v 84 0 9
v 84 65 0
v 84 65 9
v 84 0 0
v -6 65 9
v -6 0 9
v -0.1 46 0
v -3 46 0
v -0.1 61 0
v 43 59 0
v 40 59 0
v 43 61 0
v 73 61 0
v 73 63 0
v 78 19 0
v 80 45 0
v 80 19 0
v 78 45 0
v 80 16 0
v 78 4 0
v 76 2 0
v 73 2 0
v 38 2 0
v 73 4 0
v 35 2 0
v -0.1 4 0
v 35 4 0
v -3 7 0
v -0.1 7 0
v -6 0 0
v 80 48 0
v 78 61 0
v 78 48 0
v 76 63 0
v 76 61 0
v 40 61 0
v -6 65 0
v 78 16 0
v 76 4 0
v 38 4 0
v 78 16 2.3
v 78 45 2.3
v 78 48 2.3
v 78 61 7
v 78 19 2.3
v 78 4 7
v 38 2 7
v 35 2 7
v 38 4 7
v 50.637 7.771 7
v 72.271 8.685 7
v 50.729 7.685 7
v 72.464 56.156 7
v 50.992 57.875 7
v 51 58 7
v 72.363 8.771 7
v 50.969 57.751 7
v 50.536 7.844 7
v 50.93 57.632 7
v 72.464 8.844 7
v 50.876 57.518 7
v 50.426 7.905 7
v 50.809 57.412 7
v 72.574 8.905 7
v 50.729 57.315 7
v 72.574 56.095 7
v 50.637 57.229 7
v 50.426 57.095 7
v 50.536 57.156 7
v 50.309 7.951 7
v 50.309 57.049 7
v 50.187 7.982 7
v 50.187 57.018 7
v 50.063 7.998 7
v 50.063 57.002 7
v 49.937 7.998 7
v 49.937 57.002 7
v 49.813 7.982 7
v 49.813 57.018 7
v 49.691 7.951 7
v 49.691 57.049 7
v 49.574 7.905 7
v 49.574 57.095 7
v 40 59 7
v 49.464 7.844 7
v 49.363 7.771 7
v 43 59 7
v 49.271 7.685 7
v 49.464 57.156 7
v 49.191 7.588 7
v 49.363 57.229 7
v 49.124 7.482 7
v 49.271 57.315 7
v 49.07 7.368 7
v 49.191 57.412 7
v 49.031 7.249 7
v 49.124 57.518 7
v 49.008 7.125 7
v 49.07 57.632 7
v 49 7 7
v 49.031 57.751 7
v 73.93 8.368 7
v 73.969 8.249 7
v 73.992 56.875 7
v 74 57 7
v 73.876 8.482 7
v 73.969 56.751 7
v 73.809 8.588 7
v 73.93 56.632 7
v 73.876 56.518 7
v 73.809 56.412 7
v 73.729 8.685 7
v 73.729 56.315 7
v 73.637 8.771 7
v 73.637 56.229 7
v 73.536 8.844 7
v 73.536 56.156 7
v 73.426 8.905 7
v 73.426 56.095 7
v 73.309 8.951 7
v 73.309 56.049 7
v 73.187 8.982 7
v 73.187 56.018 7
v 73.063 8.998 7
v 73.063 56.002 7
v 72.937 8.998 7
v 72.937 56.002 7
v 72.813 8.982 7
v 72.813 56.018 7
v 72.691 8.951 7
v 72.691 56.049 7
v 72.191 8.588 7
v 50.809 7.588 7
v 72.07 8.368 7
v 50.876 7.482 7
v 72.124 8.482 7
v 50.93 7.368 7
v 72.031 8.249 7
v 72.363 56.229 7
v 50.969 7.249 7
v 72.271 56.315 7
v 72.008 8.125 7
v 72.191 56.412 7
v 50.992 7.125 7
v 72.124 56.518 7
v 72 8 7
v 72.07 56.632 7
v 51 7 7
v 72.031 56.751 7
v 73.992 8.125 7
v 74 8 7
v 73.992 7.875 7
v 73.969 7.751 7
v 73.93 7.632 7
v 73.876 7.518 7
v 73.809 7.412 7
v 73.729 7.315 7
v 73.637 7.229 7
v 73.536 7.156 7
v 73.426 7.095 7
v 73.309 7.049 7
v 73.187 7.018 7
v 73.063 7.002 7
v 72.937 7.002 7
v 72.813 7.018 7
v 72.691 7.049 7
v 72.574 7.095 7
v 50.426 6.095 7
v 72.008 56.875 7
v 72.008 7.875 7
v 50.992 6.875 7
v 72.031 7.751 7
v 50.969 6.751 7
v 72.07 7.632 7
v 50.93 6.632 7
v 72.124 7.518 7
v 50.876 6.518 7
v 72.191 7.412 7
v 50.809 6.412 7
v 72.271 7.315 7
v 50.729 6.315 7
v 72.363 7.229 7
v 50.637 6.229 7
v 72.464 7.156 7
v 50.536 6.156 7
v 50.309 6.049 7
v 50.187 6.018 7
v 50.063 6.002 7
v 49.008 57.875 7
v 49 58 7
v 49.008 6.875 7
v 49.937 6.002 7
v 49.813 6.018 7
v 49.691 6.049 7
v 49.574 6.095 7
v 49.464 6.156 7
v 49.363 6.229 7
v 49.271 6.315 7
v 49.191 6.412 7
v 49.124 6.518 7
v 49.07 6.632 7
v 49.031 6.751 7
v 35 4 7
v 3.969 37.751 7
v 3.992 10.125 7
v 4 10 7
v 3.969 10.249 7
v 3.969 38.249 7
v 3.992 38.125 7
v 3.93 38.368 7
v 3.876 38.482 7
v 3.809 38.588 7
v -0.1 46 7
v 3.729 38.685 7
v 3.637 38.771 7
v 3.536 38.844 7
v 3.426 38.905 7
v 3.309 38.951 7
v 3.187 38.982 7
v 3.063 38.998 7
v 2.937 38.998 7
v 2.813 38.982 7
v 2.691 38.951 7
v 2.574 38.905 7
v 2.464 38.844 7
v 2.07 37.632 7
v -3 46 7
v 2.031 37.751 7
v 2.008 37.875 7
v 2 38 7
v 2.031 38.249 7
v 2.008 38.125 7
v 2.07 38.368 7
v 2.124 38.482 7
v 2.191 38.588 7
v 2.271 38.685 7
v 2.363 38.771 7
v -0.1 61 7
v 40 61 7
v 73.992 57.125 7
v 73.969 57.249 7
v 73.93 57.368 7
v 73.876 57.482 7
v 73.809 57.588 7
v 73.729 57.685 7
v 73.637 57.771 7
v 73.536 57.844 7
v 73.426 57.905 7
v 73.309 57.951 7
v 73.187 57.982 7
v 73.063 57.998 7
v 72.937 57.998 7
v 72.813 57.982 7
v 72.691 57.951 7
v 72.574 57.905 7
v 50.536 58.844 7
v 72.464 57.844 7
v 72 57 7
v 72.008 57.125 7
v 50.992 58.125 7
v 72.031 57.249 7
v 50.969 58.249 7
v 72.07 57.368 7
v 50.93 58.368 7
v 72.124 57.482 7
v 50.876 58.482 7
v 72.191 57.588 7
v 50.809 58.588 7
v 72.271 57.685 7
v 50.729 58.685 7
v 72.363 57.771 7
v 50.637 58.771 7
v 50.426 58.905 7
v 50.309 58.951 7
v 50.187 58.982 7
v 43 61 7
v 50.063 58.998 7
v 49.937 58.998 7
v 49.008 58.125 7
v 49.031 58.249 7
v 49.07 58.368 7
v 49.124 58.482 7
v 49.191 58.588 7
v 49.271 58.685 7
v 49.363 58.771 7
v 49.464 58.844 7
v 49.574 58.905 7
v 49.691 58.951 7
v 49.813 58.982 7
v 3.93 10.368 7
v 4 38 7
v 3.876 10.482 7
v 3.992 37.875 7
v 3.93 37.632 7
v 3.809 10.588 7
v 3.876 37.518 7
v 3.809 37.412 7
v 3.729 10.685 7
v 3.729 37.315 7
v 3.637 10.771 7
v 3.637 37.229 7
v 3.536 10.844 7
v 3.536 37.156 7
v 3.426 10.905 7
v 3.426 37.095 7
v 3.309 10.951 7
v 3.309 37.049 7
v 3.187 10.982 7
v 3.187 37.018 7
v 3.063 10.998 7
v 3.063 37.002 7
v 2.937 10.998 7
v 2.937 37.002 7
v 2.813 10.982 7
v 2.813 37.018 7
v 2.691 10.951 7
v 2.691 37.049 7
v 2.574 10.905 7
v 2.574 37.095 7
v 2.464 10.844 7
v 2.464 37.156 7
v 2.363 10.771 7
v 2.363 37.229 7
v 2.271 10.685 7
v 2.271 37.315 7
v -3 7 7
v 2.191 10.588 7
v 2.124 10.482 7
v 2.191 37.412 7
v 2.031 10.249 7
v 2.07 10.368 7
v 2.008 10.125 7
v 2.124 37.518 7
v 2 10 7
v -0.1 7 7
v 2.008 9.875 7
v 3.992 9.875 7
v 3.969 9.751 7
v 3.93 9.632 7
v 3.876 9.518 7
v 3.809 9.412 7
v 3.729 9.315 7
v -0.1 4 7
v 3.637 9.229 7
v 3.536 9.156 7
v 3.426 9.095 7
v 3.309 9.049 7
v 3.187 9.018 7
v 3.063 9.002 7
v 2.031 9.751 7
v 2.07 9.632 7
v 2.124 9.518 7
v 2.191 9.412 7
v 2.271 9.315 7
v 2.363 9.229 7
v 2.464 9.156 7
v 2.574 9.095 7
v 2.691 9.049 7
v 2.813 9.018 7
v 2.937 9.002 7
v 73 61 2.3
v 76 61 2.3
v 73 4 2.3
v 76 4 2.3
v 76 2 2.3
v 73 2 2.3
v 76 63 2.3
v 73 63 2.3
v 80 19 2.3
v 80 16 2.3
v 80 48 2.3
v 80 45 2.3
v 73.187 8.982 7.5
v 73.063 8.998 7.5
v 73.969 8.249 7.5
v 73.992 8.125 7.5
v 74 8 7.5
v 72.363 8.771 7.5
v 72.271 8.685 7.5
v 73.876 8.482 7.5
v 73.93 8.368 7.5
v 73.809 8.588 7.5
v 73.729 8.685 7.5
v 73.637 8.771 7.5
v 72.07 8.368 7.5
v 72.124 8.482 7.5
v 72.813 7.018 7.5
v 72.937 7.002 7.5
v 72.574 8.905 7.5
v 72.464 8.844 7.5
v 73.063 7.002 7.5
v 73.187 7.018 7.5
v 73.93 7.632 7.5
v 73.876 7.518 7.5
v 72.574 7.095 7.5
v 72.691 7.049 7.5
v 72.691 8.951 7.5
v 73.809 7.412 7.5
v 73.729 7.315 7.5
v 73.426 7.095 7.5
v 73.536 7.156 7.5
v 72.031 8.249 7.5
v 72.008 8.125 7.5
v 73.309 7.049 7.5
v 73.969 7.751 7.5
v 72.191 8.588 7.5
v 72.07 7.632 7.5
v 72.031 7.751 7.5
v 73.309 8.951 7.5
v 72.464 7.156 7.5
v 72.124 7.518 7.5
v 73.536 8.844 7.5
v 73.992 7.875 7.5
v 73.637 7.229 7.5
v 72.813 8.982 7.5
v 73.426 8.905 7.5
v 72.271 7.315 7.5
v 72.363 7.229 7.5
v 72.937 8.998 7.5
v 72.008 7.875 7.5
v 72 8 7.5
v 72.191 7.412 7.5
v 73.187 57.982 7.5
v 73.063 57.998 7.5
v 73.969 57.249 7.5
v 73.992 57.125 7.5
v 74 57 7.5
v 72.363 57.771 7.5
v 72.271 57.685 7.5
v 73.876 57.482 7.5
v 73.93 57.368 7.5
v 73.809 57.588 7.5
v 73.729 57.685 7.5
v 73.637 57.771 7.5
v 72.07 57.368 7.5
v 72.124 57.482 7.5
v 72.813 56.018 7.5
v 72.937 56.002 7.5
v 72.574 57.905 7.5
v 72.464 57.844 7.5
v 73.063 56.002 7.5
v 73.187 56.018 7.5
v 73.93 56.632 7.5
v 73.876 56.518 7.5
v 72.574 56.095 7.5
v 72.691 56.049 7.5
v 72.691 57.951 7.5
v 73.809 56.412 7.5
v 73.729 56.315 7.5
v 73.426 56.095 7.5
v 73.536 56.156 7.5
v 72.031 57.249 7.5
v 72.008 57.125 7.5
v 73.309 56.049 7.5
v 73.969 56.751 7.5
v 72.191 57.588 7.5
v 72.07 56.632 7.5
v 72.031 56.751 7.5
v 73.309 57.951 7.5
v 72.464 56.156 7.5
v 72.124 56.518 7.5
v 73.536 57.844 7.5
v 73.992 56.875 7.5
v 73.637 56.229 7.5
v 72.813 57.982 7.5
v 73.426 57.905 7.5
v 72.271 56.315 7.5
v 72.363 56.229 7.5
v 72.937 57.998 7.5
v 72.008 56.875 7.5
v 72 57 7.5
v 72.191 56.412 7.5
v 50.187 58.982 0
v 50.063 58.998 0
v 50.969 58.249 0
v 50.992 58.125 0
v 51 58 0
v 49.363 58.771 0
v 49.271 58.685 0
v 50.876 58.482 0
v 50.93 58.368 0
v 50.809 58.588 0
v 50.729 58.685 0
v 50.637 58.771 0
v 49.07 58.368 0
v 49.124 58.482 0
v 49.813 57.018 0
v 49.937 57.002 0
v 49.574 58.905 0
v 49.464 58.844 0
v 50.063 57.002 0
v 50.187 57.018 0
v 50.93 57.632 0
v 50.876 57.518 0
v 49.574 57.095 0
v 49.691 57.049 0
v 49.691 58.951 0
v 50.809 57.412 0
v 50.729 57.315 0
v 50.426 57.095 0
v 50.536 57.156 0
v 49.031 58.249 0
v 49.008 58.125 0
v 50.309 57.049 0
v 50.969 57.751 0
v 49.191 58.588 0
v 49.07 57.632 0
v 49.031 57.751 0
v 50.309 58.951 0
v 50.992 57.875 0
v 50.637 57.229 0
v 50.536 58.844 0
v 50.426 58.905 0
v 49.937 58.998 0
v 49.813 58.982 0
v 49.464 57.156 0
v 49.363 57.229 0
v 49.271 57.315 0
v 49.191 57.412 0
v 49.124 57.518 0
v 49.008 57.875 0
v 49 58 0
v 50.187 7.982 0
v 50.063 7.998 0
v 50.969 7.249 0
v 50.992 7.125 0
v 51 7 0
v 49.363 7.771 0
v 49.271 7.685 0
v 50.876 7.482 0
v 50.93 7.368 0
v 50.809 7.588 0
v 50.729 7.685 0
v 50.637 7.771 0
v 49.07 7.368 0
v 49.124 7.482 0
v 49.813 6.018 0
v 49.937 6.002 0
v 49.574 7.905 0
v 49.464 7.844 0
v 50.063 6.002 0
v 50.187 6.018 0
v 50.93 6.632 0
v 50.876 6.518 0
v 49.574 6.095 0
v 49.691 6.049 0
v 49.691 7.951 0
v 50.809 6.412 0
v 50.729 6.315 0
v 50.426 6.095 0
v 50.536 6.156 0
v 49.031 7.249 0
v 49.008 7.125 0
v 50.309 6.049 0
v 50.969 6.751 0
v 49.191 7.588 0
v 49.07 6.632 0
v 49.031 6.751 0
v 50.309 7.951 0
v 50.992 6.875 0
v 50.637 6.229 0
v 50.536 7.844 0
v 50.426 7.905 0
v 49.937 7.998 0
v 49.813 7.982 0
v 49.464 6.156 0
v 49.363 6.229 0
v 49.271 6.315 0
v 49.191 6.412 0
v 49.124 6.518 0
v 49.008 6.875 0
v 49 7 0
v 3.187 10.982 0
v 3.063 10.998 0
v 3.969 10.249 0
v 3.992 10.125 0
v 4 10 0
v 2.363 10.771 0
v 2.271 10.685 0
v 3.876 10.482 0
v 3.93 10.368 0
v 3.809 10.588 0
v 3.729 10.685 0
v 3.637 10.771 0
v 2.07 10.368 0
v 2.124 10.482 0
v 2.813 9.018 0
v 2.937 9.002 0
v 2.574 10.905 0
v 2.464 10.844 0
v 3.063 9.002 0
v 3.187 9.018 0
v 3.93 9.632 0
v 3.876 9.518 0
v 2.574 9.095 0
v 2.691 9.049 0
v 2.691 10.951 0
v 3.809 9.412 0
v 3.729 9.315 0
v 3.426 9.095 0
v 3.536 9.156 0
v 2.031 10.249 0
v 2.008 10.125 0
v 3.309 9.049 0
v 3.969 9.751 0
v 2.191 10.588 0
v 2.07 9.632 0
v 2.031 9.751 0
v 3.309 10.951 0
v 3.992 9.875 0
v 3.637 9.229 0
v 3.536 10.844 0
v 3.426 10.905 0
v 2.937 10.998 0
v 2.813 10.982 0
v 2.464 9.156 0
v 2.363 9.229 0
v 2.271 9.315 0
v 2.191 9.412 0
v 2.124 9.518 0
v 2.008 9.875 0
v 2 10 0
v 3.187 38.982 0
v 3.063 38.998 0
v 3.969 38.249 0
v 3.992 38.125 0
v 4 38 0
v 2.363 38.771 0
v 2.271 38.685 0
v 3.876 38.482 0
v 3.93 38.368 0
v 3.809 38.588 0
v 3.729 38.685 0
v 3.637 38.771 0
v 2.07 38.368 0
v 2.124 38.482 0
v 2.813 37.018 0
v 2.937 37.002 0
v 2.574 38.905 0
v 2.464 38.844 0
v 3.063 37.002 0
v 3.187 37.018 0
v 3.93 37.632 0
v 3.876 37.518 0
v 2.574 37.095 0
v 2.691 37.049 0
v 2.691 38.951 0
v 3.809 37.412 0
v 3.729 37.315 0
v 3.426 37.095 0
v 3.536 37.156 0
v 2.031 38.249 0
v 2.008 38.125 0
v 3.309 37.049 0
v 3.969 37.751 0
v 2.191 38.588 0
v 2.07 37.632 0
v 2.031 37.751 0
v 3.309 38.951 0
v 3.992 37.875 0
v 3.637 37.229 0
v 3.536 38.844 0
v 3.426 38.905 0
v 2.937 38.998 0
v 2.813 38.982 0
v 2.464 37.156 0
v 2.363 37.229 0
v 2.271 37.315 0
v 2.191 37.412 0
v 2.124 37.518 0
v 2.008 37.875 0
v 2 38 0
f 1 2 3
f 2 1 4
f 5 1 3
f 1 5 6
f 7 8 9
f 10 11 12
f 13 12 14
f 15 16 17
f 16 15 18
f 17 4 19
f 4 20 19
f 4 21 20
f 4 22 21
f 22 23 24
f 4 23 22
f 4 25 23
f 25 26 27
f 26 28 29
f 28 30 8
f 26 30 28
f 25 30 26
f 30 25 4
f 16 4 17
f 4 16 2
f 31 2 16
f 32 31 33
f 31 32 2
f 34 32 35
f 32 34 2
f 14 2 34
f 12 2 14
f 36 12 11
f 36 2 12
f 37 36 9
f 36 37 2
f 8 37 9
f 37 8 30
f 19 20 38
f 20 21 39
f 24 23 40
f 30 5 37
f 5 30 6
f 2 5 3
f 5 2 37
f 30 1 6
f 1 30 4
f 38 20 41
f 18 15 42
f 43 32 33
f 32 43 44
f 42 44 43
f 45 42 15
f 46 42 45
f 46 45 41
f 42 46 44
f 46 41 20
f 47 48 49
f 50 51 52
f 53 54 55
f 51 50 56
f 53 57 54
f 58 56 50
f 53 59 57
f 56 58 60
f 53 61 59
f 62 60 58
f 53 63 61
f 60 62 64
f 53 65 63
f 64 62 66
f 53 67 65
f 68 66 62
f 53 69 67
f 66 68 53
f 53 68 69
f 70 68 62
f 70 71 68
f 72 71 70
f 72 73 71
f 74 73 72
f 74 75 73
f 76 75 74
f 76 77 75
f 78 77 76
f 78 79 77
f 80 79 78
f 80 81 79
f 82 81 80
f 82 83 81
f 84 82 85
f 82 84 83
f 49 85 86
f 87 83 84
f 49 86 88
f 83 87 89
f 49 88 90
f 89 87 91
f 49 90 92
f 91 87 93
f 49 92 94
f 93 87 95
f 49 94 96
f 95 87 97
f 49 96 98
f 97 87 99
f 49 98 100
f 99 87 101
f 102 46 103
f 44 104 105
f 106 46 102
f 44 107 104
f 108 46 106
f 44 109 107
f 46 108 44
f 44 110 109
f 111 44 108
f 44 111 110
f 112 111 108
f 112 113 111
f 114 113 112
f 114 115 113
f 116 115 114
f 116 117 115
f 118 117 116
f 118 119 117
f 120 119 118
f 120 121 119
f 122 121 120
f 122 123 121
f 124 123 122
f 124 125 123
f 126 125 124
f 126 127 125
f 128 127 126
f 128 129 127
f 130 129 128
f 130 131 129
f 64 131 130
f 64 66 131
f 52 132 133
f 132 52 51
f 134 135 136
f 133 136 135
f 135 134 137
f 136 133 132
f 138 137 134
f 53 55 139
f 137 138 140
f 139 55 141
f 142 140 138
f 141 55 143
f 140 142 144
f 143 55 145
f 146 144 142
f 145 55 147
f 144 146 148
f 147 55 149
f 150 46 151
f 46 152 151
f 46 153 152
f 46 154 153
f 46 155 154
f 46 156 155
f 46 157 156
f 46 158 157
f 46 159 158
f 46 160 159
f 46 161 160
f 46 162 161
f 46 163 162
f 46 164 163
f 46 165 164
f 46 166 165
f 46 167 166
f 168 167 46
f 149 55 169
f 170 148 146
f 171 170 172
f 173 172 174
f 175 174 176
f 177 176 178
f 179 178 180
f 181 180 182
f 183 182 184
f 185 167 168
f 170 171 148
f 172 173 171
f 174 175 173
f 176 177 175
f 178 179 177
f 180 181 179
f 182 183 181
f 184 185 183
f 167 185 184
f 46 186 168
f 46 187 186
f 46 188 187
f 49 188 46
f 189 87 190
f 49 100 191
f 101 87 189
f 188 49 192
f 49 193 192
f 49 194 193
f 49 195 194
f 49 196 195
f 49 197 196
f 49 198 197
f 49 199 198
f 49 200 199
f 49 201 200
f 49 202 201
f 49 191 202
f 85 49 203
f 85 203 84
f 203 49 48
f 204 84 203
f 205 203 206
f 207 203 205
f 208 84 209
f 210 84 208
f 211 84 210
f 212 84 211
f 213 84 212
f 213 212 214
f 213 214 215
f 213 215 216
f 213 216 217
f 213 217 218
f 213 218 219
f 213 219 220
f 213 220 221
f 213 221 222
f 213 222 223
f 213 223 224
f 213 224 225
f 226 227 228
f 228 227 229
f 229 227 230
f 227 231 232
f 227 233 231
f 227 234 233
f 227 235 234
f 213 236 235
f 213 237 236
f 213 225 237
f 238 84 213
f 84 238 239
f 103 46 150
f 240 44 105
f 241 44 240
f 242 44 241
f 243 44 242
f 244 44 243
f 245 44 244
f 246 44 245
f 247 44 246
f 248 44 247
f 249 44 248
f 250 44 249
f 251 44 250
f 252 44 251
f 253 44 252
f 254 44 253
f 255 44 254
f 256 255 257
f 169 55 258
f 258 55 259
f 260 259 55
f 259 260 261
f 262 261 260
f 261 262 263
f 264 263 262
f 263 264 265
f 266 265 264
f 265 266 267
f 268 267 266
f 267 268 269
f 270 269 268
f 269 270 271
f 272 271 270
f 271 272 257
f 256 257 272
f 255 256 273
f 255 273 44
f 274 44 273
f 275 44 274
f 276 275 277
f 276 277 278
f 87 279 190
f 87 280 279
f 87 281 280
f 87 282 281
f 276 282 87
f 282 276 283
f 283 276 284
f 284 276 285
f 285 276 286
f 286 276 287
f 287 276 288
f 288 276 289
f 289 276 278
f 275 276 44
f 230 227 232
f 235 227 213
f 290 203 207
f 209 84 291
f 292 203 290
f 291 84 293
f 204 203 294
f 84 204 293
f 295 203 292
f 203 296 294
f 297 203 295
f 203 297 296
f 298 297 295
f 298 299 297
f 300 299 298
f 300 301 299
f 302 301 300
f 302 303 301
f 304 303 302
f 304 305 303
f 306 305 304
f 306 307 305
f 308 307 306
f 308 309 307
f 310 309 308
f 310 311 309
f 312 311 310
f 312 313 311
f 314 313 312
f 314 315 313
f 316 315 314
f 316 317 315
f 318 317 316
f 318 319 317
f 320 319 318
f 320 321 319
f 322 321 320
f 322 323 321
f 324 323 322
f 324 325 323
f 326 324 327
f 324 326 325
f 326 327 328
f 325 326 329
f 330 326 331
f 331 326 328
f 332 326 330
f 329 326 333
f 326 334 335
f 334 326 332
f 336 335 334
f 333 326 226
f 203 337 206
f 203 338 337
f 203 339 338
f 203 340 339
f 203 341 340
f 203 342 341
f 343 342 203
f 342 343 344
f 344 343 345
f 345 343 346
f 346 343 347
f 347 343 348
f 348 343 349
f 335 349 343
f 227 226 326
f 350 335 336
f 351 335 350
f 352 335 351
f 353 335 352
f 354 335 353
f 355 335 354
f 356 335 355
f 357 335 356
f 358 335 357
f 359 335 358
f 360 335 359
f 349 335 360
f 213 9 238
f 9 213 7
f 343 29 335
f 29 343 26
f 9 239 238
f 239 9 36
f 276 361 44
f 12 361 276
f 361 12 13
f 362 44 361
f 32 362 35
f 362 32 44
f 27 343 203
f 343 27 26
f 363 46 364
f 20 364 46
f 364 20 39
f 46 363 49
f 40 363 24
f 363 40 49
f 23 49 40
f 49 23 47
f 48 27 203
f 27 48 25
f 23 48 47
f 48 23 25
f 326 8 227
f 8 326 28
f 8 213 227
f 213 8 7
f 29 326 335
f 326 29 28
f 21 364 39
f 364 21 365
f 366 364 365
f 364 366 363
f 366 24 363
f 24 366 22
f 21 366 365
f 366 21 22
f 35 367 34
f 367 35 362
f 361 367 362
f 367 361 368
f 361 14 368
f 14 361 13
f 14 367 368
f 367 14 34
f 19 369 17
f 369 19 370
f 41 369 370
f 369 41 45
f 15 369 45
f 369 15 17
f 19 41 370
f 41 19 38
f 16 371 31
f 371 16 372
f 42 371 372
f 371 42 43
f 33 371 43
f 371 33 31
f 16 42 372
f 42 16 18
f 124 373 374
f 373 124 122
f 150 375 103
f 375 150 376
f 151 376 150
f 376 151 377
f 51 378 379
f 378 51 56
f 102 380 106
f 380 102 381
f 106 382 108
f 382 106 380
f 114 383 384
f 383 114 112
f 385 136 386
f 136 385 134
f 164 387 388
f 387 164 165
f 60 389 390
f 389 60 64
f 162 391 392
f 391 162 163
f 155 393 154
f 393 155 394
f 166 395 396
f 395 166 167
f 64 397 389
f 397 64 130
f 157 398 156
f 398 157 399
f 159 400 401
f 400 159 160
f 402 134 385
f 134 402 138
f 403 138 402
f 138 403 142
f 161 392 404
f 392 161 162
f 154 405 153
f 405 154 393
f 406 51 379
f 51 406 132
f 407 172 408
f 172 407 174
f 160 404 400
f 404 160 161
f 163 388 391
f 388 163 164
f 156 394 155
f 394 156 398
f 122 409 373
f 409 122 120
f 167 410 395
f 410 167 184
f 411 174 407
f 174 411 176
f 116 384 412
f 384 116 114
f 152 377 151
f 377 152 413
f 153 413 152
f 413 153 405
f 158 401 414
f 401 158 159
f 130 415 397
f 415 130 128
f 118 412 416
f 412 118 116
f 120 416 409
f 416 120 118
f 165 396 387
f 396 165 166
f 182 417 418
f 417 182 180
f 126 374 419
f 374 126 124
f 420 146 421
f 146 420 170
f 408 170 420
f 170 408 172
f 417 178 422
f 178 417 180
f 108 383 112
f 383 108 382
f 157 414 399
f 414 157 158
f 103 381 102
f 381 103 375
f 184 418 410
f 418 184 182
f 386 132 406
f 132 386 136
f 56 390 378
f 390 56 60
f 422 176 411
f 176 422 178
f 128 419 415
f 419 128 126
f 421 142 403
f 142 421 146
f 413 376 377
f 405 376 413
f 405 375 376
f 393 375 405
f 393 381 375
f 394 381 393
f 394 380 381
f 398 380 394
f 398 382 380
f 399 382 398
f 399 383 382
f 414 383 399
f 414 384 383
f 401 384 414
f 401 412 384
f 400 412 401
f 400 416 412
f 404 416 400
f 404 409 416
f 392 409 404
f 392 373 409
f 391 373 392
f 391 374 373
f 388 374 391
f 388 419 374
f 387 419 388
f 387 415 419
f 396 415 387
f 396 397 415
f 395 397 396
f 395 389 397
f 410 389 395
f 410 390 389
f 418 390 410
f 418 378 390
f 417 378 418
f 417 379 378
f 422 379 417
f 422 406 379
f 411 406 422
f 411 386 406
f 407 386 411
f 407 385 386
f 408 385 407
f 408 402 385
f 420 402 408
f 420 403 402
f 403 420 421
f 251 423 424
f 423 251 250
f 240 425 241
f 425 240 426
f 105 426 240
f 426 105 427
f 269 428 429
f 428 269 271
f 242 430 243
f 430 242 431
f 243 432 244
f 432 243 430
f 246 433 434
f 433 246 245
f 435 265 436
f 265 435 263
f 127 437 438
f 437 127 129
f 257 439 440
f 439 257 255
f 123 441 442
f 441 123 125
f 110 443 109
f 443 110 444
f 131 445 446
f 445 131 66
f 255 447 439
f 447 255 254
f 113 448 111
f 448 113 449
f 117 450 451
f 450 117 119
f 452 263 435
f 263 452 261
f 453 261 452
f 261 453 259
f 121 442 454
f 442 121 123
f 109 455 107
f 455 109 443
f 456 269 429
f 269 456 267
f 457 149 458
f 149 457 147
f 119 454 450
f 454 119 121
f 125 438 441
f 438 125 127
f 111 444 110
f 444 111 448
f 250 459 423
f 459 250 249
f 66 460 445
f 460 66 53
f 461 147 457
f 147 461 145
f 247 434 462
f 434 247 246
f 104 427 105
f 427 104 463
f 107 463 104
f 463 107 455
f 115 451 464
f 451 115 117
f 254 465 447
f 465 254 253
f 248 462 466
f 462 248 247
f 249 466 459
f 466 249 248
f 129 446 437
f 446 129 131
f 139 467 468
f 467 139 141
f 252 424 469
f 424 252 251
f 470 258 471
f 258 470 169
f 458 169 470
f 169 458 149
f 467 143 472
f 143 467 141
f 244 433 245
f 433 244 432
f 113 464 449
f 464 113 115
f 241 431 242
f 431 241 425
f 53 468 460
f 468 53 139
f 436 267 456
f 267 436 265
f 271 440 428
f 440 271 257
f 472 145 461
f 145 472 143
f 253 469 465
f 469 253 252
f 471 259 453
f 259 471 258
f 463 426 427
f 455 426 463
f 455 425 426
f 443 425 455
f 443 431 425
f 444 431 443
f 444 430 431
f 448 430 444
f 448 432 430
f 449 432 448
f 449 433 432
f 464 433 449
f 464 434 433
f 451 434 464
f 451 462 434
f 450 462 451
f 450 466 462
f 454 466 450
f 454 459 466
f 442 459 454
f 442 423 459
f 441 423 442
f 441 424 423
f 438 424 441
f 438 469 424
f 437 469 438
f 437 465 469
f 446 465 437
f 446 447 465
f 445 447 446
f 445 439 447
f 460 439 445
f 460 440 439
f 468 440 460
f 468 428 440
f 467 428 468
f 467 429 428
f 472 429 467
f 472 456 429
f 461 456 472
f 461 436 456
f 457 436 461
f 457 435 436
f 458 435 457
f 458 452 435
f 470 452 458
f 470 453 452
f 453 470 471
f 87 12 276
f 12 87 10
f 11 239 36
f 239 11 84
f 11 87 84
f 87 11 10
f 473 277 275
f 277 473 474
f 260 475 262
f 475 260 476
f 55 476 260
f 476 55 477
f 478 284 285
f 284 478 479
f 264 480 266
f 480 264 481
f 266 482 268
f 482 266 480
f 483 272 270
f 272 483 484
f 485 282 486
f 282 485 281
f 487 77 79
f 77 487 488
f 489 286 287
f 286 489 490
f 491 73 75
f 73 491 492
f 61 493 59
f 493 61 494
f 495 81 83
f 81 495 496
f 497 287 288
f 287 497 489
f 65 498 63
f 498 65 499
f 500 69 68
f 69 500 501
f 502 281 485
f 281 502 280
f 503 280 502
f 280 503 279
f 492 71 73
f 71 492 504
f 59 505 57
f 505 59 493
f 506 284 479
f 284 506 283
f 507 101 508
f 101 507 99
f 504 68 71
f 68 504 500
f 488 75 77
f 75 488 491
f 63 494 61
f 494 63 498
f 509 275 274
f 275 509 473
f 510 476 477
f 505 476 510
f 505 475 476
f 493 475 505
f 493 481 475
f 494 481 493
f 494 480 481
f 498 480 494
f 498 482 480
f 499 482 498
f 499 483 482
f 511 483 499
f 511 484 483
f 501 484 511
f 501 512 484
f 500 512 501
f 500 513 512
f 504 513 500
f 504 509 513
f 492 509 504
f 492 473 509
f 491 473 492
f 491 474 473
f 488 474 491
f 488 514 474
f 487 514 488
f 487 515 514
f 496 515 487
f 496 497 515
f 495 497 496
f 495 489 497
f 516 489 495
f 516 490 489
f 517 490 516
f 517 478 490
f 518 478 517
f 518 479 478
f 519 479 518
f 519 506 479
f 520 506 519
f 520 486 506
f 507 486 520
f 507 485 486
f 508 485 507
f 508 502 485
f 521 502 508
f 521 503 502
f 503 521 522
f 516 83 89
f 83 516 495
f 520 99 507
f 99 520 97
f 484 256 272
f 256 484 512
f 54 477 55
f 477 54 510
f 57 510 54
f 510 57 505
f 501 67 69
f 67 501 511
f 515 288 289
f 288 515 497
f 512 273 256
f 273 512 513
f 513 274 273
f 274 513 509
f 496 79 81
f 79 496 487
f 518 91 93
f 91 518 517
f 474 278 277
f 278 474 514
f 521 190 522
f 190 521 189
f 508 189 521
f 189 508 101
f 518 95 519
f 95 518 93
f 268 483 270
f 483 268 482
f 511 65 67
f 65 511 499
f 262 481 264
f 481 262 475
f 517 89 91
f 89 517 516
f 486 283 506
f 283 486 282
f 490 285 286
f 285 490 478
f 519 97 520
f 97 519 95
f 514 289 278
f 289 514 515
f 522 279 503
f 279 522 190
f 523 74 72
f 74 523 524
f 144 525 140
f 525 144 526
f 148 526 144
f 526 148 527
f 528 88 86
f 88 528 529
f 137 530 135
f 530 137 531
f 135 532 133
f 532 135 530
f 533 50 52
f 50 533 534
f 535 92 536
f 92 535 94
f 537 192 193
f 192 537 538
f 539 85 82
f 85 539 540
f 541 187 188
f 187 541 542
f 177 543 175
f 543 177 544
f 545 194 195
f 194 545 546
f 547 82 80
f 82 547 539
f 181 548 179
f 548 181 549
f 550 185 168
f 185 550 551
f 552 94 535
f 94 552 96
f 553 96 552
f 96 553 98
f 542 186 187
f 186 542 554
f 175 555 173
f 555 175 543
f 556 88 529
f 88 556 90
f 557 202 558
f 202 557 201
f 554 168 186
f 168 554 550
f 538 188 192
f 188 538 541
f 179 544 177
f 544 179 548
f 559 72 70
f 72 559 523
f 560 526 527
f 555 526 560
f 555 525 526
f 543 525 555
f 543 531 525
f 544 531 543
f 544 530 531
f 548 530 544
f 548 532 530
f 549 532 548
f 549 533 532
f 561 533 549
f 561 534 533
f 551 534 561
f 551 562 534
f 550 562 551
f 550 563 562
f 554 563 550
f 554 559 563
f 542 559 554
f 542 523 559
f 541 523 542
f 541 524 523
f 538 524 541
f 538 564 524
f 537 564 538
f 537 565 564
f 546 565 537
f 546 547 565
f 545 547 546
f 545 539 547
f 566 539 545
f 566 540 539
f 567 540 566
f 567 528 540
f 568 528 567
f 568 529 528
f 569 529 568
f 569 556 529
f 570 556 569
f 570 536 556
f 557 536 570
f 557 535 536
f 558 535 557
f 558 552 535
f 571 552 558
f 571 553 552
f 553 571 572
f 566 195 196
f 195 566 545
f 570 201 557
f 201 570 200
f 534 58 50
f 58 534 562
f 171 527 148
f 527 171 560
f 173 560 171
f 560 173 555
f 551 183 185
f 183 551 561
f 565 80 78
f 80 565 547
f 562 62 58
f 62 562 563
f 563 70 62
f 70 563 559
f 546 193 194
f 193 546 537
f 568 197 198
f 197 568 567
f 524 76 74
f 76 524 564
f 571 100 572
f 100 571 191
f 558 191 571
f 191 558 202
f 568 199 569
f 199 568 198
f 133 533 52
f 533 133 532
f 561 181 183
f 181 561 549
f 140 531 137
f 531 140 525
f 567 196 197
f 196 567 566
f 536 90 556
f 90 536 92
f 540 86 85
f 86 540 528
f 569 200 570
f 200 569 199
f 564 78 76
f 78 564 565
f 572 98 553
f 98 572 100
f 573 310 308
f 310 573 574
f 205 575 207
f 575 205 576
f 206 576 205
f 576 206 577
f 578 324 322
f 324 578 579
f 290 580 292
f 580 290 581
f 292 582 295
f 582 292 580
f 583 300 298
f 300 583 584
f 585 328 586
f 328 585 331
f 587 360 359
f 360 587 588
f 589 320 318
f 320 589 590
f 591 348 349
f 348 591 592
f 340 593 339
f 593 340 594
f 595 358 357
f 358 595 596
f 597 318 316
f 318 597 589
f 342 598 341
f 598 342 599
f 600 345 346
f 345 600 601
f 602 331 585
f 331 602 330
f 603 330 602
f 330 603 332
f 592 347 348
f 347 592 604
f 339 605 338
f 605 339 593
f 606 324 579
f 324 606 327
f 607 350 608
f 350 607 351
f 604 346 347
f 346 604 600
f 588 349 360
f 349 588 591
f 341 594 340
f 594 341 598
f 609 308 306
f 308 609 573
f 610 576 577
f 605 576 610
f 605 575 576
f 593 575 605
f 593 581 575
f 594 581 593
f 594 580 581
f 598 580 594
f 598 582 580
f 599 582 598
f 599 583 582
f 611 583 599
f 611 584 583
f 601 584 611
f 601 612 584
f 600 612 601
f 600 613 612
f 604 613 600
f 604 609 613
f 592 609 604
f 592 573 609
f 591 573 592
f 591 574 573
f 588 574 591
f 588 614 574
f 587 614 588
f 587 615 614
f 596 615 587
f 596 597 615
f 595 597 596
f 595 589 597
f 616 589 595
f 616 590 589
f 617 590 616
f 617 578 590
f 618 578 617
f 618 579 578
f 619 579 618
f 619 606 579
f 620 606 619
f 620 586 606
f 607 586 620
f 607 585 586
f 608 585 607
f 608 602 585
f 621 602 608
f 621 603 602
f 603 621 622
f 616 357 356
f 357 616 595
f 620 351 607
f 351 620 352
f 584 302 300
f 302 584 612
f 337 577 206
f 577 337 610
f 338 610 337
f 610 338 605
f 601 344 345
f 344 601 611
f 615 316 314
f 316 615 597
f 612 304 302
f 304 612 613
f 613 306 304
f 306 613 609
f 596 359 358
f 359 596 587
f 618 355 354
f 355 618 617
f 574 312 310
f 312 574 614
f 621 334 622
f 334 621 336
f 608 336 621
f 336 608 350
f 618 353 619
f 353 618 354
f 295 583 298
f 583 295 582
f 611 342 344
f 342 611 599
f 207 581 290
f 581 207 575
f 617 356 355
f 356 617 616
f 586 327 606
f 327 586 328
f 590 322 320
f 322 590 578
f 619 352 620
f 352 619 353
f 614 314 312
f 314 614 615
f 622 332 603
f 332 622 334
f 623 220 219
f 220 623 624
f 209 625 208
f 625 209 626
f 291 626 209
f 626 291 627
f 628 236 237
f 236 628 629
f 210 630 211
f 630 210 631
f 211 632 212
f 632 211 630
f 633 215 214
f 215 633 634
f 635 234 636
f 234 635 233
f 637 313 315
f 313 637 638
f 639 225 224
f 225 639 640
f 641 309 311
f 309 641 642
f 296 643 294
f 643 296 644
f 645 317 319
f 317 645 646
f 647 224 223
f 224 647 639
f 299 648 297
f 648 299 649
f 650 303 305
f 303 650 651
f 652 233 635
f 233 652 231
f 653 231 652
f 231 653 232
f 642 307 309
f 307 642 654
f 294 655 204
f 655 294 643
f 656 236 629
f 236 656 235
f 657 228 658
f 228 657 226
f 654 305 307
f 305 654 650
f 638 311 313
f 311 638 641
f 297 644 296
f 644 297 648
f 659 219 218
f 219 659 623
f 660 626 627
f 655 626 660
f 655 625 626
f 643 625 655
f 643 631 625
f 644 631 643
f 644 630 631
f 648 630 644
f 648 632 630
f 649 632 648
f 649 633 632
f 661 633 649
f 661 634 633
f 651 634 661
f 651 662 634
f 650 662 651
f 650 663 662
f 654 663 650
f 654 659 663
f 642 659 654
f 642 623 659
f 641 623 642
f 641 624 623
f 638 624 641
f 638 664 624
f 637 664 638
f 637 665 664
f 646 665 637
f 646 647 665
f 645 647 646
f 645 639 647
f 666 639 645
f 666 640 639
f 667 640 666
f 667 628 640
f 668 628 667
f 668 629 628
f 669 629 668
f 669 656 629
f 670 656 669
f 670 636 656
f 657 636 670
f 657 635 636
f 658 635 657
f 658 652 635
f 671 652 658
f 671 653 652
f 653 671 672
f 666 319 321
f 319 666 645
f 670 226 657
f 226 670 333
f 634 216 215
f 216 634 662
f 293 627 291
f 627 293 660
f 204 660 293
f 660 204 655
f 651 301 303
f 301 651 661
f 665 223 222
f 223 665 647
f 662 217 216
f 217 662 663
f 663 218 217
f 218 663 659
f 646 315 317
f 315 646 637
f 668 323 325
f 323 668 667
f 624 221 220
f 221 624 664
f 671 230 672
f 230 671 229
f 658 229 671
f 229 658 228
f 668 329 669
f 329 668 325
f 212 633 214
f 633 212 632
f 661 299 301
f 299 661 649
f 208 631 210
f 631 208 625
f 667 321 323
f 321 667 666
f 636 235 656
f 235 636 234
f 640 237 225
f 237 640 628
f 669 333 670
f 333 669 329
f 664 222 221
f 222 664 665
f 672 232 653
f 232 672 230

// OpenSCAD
$fn=50;

xCase=90;
yCase=65;
zCase=9;
xArd=78;
yArd=57;
zArd=7;
difference(){
    translate([-6,0,0]){
        cube([xCase,yCase,zCase]);
    }
    //create space for Arduino main body
    translate([-0.1,(yCase-yArd)/2,-0.1]){
        cube([xArd+0.1,yArd,zArd+0.1]);
    }
    translate([35,2,-0.1]){
        cube([3,2.1,zArd+0.1]);
    }
    translate([-3,7,-0.1]){
        cube([3,39,zArd+0.1]);
    }
    //create space for part2
    translate([73,2,-0.1]){
    cube([3,2.1,2.4]);
    }
    translate([73,60.9,-0.1]){
    cube([3,2.1,2.4]);
    }
    translate([77.9,16,-0.1]){
    cube([2.1,3,2.4]);
    }
    translate([77.9,45,-0.1]){
    cube([2.1,3,2.4]);
    }
    translate([73,8,0]){
    cylinder(zArd+0.5,1,1);
    }
    translate([73,yCase-8,0]){
    cylinder(zArd+0.5,1,1);
    }
}

//add cylinders and blocks to fit holes in Arduino
translate([40,2+yArd,0]){
    cube([3,2,zArd]);
}
translate([50,yCase-7,0]){
    cylinder(zArd,1,1);
}
translate([50,7,0]){
    cylinder(zArd,1,1);
}
translate([3,10,0]){
    cylinder(zArd,1,1);
}
translate([3,38,0]){
    cylinder(zArd,1,1);
}
